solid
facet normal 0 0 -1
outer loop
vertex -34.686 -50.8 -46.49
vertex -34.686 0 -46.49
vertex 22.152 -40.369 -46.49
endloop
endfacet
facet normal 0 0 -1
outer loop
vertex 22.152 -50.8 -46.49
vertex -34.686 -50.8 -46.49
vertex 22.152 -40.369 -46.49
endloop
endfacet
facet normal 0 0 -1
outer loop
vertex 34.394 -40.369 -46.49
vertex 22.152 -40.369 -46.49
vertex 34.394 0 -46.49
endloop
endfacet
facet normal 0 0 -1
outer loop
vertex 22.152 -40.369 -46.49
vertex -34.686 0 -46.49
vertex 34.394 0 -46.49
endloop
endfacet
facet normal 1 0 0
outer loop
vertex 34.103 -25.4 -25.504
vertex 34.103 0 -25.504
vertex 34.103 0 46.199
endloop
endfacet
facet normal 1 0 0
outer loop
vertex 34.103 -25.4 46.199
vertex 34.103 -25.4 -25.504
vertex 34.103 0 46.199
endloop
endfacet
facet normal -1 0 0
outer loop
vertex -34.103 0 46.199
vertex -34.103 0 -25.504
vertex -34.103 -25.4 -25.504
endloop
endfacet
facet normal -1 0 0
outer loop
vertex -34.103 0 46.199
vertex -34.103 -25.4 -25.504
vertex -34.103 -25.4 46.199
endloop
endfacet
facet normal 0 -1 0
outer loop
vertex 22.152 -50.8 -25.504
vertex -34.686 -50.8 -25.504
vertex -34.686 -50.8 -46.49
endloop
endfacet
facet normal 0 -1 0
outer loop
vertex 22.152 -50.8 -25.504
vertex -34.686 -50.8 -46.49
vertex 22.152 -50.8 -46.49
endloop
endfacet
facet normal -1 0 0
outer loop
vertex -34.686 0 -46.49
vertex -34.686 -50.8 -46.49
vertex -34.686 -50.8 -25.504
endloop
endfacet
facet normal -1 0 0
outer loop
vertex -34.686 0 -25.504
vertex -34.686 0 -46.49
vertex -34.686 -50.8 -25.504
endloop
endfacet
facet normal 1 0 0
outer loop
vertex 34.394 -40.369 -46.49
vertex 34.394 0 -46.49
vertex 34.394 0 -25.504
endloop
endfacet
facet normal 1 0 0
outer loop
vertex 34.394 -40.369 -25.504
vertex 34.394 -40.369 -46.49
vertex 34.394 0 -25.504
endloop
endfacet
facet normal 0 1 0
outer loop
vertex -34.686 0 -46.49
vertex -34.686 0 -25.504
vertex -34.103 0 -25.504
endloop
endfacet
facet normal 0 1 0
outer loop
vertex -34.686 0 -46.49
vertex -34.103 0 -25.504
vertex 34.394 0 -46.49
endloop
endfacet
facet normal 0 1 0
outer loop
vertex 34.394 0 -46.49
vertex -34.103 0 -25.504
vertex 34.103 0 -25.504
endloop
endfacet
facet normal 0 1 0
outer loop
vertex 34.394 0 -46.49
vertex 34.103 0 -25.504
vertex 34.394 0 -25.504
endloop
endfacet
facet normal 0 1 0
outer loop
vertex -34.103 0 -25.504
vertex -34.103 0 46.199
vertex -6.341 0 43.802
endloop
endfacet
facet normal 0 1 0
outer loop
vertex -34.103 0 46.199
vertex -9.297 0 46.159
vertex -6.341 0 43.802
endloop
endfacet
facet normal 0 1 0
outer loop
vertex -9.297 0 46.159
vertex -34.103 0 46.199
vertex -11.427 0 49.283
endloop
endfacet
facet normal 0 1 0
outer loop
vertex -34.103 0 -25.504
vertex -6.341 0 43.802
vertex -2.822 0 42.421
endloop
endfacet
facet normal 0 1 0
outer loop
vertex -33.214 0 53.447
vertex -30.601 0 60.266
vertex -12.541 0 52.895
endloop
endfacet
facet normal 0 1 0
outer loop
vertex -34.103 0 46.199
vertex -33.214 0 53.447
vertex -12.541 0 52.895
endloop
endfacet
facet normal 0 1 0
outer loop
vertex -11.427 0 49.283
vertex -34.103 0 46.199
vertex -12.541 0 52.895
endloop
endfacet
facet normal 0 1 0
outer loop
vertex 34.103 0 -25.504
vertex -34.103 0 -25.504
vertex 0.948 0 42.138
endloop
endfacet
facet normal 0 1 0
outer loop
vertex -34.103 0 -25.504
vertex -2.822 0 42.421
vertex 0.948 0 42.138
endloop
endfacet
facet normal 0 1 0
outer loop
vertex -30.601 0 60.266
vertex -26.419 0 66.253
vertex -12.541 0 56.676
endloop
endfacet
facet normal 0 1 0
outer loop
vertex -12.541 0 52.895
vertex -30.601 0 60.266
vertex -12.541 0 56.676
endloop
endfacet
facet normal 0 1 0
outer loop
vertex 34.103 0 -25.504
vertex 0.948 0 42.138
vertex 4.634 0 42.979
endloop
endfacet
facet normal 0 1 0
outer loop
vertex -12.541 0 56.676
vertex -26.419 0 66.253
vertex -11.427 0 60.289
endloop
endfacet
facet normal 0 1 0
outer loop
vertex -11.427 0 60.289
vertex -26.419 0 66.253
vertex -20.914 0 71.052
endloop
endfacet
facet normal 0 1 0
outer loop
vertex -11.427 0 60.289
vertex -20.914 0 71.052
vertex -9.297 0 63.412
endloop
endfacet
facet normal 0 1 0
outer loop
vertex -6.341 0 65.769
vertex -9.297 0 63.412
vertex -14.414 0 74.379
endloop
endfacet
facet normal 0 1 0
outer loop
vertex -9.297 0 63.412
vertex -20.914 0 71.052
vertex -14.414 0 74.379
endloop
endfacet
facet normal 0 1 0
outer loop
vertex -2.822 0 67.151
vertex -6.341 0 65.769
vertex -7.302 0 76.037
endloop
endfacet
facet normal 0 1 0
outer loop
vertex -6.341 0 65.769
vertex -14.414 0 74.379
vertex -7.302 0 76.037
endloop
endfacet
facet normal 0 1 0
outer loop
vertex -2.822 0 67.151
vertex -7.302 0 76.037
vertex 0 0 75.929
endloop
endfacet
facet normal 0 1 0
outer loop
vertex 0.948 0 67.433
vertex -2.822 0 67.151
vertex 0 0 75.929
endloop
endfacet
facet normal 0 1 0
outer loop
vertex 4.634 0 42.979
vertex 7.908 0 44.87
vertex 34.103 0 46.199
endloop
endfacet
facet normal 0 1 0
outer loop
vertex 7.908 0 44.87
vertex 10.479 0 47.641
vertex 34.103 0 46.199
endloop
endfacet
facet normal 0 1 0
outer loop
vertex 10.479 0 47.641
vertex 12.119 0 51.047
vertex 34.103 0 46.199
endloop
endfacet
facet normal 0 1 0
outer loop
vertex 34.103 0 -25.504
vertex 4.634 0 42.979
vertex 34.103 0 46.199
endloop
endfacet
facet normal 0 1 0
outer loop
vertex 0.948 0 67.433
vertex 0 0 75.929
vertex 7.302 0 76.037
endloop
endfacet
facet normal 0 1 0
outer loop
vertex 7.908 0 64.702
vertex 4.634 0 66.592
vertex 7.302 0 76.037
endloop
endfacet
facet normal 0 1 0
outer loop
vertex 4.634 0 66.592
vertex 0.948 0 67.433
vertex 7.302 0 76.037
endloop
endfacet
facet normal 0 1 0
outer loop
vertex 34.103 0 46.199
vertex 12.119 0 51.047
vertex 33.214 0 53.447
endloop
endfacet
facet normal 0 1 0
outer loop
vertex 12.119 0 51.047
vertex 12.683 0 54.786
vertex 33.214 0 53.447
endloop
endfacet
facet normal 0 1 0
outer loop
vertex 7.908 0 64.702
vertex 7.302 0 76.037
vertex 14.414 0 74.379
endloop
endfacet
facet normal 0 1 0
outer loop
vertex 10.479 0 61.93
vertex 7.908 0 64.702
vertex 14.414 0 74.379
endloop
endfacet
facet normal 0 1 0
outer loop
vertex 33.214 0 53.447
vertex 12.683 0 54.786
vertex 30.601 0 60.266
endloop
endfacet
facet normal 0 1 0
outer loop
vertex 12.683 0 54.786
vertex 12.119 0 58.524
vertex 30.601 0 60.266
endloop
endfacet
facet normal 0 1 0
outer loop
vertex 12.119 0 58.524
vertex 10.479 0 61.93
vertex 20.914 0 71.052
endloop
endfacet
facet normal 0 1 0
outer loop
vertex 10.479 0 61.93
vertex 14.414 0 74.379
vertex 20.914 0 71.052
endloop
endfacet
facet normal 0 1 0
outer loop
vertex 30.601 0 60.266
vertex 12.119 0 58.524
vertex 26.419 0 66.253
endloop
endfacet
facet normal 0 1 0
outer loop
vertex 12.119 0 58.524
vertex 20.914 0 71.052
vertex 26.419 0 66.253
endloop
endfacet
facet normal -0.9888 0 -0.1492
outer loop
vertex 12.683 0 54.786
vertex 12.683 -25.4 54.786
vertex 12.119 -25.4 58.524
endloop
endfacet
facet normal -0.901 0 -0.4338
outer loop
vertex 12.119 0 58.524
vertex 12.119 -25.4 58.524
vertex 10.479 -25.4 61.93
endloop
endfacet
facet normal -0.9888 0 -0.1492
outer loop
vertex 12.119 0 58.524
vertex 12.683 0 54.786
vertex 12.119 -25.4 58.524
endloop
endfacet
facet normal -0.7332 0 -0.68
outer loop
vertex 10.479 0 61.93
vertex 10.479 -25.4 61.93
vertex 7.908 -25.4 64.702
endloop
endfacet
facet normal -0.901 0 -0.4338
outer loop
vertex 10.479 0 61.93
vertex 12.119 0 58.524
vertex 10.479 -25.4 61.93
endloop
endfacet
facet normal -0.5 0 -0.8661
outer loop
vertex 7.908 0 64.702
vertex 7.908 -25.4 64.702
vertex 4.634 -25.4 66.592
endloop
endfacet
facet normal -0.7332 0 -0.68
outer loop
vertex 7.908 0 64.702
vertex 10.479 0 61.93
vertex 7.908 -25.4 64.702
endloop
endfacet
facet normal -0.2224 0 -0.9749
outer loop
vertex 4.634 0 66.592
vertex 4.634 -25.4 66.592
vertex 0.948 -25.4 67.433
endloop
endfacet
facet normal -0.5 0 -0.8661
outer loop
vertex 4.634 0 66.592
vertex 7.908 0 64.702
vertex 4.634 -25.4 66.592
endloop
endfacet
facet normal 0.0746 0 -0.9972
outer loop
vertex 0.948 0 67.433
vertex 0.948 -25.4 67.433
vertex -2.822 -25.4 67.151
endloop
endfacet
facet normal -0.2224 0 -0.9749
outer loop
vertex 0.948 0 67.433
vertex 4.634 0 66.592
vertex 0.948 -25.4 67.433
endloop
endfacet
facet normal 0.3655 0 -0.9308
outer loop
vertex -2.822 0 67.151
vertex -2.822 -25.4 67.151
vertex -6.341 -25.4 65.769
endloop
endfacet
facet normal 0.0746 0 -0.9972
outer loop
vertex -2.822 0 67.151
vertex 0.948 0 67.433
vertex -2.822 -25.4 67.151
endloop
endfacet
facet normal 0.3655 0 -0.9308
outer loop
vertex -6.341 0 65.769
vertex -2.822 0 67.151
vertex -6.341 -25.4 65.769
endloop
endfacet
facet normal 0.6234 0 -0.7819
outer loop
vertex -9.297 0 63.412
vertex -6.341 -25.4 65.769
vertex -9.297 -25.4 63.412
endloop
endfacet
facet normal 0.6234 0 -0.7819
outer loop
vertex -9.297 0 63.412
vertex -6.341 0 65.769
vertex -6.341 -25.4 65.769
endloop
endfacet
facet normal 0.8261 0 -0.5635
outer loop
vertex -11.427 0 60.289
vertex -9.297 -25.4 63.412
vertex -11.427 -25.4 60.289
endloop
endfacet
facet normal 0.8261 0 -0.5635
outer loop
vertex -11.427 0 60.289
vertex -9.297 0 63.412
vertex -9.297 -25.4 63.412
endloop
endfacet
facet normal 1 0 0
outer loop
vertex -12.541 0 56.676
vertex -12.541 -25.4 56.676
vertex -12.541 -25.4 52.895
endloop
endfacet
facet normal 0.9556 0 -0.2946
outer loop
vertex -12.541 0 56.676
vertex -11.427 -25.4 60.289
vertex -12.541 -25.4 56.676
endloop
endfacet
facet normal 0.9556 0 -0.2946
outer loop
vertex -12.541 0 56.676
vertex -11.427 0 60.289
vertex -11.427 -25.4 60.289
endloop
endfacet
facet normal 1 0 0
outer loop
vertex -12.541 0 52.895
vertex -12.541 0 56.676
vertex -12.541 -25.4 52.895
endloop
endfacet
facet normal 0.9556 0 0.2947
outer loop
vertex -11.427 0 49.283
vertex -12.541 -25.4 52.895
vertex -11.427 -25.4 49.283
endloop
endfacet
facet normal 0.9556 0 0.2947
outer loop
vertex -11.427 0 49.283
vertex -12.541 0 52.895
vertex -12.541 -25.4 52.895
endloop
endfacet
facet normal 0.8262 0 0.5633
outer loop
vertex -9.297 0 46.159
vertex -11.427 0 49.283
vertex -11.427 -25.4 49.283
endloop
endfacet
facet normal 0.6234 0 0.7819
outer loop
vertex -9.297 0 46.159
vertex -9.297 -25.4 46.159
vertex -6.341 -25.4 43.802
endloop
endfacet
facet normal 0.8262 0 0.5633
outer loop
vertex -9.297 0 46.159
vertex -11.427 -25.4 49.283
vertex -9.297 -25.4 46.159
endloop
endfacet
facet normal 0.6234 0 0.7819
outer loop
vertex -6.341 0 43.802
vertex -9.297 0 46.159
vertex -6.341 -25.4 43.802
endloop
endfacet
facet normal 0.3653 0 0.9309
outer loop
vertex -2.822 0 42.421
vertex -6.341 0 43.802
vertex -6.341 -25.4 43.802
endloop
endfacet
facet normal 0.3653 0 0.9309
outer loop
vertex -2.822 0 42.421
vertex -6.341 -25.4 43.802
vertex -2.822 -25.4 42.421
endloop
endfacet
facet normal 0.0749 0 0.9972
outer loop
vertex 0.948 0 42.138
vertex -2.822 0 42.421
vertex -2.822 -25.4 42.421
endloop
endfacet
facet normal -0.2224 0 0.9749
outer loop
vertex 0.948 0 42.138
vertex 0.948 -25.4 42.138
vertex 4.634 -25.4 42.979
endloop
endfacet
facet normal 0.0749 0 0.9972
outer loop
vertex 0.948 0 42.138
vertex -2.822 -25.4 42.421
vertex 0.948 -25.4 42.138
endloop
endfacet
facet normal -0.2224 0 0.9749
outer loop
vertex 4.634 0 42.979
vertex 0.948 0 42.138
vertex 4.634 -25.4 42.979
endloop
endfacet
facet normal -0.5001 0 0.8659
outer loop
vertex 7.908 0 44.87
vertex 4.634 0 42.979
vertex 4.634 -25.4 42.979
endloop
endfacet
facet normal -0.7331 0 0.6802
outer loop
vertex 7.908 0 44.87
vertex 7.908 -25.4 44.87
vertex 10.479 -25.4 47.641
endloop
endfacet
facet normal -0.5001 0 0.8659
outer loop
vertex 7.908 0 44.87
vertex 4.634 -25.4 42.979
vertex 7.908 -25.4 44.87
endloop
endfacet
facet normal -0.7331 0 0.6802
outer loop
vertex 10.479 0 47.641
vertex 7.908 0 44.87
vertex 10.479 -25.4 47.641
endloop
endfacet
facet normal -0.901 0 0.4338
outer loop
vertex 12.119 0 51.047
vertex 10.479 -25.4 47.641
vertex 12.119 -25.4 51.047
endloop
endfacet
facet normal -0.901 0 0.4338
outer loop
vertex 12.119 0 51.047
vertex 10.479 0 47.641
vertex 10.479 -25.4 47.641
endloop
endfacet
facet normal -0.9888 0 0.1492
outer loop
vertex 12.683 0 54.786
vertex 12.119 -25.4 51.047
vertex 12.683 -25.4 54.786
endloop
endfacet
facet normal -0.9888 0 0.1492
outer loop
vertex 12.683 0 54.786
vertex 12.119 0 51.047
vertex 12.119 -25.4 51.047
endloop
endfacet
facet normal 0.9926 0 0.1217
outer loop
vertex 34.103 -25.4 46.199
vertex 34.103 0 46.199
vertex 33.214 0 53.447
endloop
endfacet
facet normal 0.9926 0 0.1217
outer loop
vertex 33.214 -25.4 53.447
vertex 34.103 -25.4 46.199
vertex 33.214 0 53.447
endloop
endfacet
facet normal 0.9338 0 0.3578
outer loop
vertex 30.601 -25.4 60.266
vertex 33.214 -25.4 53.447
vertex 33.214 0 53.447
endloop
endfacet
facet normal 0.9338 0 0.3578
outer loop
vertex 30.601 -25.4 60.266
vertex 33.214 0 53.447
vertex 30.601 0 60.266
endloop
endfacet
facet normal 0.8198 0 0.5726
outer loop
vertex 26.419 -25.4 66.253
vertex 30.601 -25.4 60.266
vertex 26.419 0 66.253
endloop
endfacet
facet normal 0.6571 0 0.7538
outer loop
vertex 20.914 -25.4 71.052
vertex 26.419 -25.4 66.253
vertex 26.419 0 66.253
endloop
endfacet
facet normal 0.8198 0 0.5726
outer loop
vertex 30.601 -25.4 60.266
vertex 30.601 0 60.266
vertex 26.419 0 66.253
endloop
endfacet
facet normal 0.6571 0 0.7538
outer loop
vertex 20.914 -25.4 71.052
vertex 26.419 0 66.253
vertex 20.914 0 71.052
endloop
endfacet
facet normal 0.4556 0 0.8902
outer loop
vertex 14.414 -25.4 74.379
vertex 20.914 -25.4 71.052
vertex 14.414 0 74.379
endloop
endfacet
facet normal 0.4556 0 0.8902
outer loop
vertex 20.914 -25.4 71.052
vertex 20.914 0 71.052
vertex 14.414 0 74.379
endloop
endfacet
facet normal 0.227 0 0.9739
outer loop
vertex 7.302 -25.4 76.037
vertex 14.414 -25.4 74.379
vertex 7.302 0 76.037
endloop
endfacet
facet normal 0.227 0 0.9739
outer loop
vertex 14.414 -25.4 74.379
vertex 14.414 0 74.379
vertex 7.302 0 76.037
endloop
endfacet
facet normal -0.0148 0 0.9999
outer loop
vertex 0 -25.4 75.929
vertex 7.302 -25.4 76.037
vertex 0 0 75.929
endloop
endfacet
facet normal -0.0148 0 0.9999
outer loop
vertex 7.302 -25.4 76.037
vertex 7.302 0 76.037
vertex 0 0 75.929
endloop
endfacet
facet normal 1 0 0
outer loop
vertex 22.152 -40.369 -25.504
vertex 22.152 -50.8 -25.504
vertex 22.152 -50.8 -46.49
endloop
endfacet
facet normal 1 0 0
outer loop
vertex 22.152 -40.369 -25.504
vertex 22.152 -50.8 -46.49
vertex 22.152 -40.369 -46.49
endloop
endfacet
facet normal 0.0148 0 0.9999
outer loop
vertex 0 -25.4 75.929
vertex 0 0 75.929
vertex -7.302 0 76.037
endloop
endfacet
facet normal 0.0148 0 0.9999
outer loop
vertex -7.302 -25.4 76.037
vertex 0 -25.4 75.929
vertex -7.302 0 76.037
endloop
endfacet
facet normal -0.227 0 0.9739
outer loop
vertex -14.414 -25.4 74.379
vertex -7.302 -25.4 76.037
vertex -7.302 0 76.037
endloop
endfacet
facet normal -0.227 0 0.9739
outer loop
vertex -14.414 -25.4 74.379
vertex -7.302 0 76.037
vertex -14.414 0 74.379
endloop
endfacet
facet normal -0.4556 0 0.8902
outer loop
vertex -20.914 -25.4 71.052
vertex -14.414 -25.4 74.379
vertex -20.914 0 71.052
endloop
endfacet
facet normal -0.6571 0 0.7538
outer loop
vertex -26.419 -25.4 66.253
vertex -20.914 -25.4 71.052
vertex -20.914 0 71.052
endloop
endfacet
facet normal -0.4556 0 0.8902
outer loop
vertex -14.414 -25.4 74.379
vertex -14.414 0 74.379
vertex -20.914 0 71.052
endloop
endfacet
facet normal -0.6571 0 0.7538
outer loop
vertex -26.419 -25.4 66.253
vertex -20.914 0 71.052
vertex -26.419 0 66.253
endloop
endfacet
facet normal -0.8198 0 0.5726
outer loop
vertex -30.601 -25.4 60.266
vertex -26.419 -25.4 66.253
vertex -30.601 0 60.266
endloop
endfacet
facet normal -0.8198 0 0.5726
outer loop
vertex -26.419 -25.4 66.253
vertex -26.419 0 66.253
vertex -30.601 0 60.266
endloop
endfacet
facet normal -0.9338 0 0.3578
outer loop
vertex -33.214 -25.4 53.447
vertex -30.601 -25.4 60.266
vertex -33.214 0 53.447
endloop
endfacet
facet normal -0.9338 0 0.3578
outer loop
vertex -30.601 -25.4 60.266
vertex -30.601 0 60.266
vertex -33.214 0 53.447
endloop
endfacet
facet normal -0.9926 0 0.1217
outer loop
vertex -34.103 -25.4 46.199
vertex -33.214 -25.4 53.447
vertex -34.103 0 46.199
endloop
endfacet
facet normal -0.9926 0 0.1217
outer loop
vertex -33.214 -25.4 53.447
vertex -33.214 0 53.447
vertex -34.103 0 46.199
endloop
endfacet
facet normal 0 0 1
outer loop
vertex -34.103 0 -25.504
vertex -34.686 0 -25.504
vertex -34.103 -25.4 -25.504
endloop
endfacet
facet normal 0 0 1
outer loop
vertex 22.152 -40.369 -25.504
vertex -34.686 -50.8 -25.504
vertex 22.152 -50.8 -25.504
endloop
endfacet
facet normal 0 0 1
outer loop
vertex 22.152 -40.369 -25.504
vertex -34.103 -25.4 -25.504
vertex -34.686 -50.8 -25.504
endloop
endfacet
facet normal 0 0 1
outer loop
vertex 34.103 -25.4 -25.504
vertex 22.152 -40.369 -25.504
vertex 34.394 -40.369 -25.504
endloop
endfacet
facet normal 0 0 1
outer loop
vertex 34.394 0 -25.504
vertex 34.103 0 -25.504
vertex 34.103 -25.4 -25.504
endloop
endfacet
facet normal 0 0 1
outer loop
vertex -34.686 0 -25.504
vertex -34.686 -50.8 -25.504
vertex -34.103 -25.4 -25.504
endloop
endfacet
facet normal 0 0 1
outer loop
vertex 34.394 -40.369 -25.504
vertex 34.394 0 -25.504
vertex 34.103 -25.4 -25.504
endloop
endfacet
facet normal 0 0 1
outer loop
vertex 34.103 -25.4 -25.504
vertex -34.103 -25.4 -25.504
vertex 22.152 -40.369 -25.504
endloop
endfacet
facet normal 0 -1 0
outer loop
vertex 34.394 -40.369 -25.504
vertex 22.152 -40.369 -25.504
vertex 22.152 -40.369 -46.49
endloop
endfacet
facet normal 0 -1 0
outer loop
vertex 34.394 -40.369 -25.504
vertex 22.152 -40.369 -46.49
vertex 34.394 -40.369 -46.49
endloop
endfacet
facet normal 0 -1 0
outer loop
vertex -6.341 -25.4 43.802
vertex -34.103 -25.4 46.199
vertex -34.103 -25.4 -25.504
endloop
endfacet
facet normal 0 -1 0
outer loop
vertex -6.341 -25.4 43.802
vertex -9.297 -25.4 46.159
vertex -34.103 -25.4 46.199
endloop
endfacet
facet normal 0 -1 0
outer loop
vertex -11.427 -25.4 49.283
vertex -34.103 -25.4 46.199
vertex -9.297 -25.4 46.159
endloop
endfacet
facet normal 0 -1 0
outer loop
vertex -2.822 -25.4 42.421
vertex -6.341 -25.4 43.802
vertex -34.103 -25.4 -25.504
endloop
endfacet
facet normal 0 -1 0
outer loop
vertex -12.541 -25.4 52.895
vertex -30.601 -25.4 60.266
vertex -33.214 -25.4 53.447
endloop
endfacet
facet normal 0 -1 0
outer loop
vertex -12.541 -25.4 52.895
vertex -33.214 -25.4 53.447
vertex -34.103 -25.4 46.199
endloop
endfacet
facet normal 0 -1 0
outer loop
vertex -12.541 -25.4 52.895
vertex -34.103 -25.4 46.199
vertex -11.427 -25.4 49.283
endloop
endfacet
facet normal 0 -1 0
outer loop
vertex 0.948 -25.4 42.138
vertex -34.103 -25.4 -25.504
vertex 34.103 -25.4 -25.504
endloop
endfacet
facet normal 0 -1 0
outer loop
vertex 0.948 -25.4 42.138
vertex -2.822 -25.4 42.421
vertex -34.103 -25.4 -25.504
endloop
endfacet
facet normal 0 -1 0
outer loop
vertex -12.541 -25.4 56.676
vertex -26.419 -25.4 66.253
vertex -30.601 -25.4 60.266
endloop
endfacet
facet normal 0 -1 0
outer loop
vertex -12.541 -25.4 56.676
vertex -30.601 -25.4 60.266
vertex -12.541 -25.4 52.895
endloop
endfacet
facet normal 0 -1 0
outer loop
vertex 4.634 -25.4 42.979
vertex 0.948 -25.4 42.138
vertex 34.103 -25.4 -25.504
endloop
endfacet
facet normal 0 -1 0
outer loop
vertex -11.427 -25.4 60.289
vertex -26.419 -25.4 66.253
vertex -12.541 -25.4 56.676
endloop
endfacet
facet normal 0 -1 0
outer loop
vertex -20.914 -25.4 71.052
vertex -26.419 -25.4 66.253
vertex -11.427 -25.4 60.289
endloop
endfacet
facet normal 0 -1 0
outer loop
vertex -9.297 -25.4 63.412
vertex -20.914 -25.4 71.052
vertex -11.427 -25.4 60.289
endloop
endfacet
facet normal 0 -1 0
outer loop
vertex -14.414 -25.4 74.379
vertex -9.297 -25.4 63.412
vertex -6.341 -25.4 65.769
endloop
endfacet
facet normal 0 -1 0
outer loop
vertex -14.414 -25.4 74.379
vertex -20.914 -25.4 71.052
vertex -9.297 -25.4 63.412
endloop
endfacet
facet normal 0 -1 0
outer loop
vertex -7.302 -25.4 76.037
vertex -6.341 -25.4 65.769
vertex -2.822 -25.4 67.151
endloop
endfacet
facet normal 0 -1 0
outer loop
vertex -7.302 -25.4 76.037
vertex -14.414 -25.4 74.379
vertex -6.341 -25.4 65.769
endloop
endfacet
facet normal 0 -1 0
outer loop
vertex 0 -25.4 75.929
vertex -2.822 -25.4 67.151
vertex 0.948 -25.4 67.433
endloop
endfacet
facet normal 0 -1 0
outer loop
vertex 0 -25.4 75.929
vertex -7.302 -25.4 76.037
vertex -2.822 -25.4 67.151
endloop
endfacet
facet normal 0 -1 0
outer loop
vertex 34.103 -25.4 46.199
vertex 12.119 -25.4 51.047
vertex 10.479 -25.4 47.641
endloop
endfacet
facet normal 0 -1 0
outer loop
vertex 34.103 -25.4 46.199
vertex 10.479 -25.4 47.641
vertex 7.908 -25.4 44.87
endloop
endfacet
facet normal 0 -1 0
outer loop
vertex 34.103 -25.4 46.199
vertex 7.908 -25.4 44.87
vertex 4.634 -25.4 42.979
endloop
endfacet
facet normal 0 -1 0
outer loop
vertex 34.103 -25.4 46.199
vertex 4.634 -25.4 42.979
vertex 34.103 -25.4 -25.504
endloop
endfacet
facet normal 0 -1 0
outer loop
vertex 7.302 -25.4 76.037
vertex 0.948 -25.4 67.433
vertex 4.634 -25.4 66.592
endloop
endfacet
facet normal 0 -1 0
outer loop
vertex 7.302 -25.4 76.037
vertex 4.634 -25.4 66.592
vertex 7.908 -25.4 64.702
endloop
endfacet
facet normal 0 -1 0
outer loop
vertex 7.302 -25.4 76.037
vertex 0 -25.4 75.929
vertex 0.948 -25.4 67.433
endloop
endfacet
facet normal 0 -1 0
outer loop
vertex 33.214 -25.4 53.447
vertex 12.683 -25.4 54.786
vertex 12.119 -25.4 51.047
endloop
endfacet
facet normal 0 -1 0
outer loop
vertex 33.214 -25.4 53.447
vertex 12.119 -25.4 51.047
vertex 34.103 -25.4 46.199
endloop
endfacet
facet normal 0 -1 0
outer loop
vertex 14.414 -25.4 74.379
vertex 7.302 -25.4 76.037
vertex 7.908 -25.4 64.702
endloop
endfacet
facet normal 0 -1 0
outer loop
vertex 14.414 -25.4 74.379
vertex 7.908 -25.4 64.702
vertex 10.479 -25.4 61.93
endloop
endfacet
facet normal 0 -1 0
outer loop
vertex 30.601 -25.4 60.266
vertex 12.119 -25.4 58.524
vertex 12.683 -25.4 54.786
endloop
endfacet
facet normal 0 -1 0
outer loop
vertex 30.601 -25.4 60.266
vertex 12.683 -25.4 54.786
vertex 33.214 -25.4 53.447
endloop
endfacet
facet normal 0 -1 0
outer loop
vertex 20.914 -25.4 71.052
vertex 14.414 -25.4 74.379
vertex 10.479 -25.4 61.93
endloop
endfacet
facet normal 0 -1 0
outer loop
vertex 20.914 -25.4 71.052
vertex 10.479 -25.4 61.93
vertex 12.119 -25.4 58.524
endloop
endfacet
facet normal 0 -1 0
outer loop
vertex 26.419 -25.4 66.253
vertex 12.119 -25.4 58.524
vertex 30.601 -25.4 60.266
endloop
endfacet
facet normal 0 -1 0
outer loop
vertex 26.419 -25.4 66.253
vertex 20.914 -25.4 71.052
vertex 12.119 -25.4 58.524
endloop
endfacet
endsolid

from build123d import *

# Parameters (mm, degrees)
F0_W     = 68.205244
F0_H     = 92.397712
F1_DEPTH = 25.4
F2_R     = 12.682951
F3_DEPTH = 25.401
F4_W     = 69.079674
F4_H     = 20.986233
F5_DEPTH = 50.8
F6_W     = 17.488527
F6_H     = 13.407867
F7_DEPTH = 46.49133


with BuildPart() as f1:
    # F0 (on Front) → F1 (new body)
    with BuildSketch(Plane.XZ):
        with BuildLine():
            ThreePointArc((0, 75.929344), (-23.81299, 68.820144), (-34.102622, 46.198856))
            Line((-34.102622, 46.198856), (34.102622, 46.198856))
            ThreePointArc((34.102622, 46.198856), (23.81299, 68.820144), (0, 75.929344))
        make_face()
        Rectangle(F0_W, F0_H)
    extrude(amount=F1_DEPTH)

    # F2 (on Front) → F3 (cut, through all)
    with BuildSketch(Plane.XZ):
        with Locations((0, 54.785658)):
            Circle(F2_R)
    extrude(amount=F3_DEPTH, mode=Mode.SUBTRACT)

    # F4 (on Front) → F5 (join)
    with BuildSketch(Plane.XZ):
        with Locations((-0.145737, -35.997214)):
            Rectangle(F4_W, F4_H)
    extrude(amount=F5_DEPTH)

    # F6 (on Top) → F7 (cut, through all)
    with BuildSketch(Plane.XY):
        with Locations((30.896394, -47.073276)):
            Rectangle(F6_W, F6_H)
    extrude(amount=-F7_DEPTH, mode=Mode.SUBTRACT)


solid = f1.part
